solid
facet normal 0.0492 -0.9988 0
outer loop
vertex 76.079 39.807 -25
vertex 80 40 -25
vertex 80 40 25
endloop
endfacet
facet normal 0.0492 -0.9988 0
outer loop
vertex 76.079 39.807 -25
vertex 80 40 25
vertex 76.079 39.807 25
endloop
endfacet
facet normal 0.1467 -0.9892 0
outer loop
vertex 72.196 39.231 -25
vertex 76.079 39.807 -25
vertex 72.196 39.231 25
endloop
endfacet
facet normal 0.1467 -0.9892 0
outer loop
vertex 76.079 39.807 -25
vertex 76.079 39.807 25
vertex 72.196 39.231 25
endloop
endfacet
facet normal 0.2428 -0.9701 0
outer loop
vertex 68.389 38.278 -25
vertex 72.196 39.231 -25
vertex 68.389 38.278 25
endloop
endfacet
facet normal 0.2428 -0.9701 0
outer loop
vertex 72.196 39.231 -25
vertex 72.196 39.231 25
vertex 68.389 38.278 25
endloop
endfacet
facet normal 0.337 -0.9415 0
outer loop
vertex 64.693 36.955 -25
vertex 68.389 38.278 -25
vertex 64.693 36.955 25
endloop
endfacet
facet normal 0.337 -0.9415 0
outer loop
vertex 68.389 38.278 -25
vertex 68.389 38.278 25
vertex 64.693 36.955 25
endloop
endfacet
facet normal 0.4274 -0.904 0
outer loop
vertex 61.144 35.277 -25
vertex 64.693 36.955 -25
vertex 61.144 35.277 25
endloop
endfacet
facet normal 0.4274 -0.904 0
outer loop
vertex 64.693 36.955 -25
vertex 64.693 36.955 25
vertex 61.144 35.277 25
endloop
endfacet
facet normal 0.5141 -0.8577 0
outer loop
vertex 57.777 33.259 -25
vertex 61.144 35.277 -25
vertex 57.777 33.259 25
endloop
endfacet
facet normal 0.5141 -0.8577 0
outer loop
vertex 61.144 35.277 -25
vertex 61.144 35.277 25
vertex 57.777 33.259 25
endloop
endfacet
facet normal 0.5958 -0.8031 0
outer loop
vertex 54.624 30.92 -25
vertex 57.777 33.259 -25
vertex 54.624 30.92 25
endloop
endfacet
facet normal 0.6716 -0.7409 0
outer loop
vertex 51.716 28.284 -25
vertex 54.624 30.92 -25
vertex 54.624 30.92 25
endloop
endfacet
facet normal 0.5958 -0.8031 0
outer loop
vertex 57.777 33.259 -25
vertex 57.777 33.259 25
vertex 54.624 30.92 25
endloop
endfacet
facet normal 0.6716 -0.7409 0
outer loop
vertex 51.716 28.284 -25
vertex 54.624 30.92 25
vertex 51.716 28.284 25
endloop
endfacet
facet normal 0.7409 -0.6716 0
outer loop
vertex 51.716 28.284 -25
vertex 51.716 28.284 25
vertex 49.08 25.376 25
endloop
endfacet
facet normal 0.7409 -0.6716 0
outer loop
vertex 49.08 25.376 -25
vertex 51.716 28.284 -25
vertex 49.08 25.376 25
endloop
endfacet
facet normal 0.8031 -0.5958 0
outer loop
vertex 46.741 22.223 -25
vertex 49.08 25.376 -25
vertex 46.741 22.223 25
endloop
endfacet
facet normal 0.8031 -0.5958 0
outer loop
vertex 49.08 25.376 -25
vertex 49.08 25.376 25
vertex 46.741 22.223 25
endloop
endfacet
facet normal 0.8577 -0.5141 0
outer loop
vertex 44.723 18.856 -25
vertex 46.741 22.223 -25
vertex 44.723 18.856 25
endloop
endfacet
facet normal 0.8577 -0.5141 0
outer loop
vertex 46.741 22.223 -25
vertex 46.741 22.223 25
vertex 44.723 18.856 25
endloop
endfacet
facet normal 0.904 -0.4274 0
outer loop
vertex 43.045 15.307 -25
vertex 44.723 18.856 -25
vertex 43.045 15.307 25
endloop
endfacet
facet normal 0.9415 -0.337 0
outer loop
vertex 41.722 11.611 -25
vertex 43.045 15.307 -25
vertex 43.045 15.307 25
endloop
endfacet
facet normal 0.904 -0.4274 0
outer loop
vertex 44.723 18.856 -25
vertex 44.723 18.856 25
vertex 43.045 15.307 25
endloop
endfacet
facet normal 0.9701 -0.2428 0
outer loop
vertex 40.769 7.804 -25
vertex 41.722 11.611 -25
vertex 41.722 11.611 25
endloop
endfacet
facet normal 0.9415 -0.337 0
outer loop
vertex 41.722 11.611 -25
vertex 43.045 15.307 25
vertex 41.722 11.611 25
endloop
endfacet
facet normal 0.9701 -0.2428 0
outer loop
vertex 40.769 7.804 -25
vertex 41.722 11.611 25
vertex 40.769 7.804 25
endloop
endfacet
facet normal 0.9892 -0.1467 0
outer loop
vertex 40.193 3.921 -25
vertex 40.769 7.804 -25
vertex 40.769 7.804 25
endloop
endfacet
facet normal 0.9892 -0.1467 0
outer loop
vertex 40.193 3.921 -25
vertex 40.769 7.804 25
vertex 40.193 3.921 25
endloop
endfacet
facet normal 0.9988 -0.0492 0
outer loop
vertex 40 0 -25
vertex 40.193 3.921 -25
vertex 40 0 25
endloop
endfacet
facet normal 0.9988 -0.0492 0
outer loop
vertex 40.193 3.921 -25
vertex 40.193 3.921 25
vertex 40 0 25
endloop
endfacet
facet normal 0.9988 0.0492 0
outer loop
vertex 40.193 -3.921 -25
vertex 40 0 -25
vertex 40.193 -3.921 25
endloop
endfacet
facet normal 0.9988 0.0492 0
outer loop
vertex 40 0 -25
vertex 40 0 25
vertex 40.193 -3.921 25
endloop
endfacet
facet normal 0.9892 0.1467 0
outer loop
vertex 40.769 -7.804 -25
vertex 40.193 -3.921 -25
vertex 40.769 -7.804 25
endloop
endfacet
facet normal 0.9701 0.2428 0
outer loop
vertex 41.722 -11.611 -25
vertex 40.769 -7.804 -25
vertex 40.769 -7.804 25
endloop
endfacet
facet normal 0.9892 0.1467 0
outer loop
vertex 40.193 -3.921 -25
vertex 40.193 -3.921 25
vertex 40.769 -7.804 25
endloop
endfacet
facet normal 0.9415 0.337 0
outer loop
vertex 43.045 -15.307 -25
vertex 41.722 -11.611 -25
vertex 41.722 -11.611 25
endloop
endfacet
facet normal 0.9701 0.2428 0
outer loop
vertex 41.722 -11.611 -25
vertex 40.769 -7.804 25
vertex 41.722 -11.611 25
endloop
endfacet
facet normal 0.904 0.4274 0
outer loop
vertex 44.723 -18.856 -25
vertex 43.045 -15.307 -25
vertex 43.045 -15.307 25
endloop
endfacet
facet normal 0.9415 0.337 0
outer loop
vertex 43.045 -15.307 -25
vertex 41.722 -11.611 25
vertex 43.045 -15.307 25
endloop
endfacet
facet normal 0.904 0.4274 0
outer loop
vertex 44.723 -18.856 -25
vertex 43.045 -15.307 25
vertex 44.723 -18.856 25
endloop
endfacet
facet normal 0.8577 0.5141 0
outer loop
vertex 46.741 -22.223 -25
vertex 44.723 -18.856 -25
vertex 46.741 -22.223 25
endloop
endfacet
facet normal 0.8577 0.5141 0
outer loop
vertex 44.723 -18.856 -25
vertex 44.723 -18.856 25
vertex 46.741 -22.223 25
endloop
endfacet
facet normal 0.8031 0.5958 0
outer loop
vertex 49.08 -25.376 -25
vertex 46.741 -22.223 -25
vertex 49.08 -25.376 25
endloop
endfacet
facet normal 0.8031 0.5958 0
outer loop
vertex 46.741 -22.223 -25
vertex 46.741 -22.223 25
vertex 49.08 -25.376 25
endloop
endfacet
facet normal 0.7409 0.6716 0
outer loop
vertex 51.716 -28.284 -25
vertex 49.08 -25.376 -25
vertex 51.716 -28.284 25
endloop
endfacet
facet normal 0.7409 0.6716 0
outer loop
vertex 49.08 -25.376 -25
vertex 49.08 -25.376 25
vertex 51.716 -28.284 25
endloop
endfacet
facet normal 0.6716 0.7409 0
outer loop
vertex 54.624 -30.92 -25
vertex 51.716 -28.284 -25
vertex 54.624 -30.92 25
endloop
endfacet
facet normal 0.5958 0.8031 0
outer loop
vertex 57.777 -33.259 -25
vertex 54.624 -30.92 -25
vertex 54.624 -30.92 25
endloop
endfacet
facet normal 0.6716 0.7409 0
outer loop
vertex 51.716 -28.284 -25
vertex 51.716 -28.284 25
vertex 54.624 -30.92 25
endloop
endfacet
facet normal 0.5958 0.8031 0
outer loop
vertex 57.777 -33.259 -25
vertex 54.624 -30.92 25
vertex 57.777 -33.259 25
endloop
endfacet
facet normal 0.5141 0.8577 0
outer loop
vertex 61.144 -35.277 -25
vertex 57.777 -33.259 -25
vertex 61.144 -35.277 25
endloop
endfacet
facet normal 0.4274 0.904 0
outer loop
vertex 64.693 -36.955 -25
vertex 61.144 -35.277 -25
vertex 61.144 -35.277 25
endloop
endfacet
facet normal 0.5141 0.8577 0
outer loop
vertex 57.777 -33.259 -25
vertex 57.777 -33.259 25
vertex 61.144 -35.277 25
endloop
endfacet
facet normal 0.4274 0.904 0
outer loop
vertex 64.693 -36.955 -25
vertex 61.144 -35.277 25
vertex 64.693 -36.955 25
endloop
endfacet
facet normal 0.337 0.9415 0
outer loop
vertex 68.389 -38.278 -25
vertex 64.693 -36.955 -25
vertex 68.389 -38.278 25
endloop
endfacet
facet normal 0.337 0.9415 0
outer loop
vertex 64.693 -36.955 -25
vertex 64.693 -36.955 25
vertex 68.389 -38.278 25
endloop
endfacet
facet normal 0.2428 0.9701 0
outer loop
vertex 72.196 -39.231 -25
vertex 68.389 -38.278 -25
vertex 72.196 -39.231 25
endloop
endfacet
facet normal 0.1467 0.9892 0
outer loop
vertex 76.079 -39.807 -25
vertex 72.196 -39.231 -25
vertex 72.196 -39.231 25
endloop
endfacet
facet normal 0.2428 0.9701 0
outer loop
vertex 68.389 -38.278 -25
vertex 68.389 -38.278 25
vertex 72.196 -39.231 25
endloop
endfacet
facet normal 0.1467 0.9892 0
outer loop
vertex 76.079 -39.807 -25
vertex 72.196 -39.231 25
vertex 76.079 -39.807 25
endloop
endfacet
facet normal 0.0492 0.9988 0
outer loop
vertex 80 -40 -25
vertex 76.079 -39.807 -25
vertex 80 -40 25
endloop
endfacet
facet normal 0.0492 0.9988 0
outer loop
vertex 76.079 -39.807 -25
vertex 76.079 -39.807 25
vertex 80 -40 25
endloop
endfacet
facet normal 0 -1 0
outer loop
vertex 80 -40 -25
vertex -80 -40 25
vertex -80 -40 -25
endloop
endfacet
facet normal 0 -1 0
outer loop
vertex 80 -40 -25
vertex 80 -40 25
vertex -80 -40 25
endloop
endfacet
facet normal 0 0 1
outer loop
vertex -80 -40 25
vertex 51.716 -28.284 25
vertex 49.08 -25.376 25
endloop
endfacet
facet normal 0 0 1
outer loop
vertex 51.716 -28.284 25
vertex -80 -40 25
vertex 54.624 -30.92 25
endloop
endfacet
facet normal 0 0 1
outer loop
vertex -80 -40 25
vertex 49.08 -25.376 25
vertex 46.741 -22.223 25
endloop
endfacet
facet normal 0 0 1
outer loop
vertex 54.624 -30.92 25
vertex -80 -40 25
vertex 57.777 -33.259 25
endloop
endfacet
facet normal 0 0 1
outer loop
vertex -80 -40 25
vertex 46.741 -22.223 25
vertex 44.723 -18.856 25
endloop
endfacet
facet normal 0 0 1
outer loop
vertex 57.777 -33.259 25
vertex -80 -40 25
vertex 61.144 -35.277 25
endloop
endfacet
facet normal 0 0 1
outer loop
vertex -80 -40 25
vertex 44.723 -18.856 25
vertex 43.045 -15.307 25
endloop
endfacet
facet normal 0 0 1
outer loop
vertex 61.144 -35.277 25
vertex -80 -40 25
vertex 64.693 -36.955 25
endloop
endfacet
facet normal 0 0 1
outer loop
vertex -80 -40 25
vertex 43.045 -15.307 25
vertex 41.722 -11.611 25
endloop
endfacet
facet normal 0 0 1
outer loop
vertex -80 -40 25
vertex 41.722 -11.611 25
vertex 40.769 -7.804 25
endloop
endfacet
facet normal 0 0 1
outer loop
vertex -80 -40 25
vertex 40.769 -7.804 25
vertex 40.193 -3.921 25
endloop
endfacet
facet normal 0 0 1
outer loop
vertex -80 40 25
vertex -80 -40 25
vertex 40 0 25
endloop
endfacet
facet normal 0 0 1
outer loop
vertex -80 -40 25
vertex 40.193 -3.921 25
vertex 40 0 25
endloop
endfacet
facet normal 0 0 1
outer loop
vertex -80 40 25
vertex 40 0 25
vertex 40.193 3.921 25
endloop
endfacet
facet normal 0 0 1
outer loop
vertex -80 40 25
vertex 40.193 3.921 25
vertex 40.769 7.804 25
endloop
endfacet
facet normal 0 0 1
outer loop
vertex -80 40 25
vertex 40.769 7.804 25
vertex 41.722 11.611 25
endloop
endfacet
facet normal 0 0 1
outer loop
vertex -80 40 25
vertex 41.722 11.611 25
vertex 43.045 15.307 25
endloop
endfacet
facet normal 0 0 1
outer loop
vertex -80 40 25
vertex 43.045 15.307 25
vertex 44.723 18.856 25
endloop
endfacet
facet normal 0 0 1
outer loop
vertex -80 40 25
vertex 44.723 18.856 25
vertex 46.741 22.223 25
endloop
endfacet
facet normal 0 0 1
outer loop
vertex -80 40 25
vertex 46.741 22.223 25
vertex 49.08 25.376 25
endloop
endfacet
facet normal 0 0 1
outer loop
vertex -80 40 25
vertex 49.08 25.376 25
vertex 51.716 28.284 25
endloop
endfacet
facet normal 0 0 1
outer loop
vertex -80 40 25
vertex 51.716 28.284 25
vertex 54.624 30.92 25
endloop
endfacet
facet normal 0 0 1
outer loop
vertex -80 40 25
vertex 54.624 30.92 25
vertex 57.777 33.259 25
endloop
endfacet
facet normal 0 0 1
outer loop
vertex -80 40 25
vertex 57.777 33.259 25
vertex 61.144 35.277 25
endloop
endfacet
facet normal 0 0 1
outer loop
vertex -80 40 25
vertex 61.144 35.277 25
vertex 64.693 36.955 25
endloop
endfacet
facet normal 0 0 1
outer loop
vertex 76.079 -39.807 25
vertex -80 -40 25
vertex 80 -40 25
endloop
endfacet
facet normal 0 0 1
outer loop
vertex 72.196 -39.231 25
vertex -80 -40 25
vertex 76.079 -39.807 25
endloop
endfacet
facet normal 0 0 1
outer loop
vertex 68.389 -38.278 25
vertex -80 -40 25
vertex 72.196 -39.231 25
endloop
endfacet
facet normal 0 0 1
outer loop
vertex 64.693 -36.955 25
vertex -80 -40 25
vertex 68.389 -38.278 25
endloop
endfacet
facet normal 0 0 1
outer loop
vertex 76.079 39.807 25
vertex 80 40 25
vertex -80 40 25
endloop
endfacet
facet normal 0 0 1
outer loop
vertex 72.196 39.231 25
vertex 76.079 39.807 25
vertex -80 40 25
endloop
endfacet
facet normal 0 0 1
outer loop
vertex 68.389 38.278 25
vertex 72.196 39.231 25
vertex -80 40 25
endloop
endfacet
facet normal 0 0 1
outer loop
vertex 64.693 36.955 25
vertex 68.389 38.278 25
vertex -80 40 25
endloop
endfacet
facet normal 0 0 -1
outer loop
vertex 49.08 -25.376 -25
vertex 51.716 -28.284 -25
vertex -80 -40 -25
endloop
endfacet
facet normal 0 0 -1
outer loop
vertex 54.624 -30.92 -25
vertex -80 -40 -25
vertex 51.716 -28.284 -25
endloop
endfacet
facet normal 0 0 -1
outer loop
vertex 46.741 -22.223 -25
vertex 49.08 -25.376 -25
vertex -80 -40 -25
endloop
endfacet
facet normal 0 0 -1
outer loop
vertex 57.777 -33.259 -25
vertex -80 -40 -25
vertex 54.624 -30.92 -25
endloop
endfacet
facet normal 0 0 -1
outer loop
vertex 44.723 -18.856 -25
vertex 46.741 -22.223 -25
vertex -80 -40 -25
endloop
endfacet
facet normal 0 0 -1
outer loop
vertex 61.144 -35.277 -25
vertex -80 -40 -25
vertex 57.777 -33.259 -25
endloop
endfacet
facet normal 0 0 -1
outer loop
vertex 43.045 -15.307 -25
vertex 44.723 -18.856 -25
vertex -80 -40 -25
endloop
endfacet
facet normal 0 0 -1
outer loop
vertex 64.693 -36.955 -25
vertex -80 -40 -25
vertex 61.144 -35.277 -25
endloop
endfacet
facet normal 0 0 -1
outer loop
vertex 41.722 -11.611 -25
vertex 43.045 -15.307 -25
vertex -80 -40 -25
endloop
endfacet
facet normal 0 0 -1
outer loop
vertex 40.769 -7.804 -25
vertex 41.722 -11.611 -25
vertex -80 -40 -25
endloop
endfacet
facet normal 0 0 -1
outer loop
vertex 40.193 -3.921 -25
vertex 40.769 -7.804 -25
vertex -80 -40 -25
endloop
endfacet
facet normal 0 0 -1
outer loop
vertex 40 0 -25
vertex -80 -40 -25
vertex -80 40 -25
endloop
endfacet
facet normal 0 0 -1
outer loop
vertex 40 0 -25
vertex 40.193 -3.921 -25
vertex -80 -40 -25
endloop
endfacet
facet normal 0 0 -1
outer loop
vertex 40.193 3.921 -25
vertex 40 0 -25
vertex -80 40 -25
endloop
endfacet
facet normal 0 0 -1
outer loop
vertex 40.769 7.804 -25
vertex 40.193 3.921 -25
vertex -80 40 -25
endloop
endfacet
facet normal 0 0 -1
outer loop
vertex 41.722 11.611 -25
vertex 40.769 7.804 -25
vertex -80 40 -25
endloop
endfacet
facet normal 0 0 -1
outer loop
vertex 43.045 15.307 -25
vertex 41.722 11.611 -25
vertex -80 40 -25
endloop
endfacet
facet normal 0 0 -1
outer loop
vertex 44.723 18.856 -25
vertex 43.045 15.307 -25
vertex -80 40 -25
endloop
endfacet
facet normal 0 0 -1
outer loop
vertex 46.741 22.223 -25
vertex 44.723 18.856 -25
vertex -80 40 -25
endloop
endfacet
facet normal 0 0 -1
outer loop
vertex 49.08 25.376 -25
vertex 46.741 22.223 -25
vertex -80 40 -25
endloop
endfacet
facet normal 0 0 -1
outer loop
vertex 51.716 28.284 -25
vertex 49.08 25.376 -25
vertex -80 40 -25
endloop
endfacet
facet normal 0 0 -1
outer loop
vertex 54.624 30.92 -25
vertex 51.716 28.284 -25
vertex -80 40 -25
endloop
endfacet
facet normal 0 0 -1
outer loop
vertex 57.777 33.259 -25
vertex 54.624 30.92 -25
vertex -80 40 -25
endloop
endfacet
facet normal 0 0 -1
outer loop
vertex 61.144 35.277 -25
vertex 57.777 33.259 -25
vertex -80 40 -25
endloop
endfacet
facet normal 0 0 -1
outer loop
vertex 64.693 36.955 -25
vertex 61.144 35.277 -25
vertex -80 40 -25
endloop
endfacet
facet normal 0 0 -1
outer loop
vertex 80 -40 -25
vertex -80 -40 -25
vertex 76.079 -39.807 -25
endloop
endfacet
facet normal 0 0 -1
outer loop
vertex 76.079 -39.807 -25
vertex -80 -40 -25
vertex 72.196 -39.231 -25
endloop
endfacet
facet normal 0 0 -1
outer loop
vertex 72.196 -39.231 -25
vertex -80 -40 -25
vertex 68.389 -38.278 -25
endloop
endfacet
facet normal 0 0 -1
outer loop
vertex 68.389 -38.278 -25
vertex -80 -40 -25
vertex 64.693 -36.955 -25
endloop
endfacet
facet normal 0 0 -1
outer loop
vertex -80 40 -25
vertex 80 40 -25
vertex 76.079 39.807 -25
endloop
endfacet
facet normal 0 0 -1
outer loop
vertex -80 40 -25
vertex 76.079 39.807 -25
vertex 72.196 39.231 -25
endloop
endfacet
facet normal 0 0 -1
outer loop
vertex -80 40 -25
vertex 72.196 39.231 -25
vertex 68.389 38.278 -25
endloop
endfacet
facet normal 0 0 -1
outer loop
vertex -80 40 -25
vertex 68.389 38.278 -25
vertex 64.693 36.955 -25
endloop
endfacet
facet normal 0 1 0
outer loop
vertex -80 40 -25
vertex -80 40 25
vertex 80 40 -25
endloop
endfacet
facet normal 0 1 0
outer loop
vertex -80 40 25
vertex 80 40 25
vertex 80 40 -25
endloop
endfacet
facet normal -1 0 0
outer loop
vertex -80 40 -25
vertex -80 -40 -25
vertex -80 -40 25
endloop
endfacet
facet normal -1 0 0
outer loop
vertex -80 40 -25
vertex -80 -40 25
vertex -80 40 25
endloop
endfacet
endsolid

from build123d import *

# Parameters (mm, degrees)
F0_W      = 80
F0_H      = 50
F1_DEPTH  = 80
F1_FACE_W = 80
F1_FACE_H = 50
F2_DEPTH  = 80
F4_DEPTH  = 50


with BuildPart() as f1:
    # F0 (on Right) → F1 (new body)
    with BuildSketch(Plane.YZ):
        Rectangle(F0_W, F0_H)
    extrude(amount=F1_DEPTH)

    # F1_face (on face) → F2 (join)
    with BuildSketch(Plane(origin=(0, 0, 0), x_dir=(0, 1, 0), z_dir=(-1, 0, 0))):
        Rectangle(F1_FACE_W, F1_FACE_H)
    extrude(amount=F2_DEPTH)

    # F3 (on face) → F4 (cut)
    with BuildSketch(Plane.XY.offset(25)):
        with BuildLine():
            Line((80, -40), (80, 40))
            ThreePointArc((80, 40), (40, 0), (80, -40))
        make_face()
    extrude(amount=-F4_DEPTH, mode=Mode.SUBTRACT)


solid = f1.part
